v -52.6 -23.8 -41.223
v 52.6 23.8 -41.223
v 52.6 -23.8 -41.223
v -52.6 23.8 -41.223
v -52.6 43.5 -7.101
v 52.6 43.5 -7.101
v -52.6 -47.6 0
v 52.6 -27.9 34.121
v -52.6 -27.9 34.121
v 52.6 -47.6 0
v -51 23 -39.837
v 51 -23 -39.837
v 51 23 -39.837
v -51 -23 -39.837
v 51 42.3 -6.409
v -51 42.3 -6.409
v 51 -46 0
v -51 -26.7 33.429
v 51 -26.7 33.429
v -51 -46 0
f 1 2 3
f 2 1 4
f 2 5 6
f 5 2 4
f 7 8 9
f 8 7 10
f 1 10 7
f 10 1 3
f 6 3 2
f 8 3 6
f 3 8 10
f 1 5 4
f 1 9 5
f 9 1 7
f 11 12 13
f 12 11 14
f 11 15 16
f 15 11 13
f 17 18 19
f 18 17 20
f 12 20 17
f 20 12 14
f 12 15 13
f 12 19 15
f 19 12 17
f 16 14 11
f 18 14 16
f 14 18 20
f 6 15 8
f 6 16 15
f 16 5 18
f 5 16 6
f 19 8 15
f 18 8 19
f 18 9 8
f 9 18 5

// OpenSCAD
/* [Container] */
// Create a tile container for hexagon tiles.
// example: Catan tiles: Mayfair editions: base + seafarers + 5-6 expansion for both.
// diameter of hex tile (mm).  Measure point to point across center of tile.  Add a few extra mm so tiles fit nicely.
_d = 92;  

// Length of container (mm). Add a few extra mm so tiles fit nicely.
_l = 102; 

// thickness of container walls (mm)
_wall_thickness = 1.6; 

/* [Lid parameters] */
// generate a lid (instead of container) that will fit the storage container defined by other params
_generate = "container"; //[container, lid] 

// wall thickness of lid
_lid_wall_thickness = 1.2; 
// The lid will be snug, depending on printer.  Provide a negative to make tighter, positive to make looser fitting lid (ex: 0.2, will make a looser fitting lid.
_lid_fudge = 0;  

module hex_holder(diam, l, wall, extra_cut = 0)
{
	outer_d = diam + (wall * 2);
	outer_l = l + (wall * 2);
	difference() {
		rotate([0,0,30]) cylinder(outer_l,d=outer_d,d=outer_d, center = true, $fn=6);
		rotate([0,0,30]) cylinder(l,d=diam,d=diam, center = true, $fn=6);
		translate([0,(diam * (11/16)) - extra_cut,0])  
            cube([outer_d + .1,outer_d +  .1,outer_l + .1], center=true);
	}
}


if(_generate == "lid")
{
    rotate([60,0,0])
    rotate([0,90,0])
    hex_holder(_d + (2 * _wall_thickness) + 1.5 + _lid_fudge
                , _l + (2 * _wall_thickness) + 1.2 + _lid_fudge
                , _lid_wall_thickness 
                ,((21/16) * _wall_thickness) + _lid_wall_thickness);
}
if(_generate == "container")
{
    rotate([60,0,0])
    rotate([0,90,0])
    hex_holder(_d, _l, _wall_thickness);
}

//ex: // Neuroshima Hex tiles:
//_d = 41; 
//_l = 62;
